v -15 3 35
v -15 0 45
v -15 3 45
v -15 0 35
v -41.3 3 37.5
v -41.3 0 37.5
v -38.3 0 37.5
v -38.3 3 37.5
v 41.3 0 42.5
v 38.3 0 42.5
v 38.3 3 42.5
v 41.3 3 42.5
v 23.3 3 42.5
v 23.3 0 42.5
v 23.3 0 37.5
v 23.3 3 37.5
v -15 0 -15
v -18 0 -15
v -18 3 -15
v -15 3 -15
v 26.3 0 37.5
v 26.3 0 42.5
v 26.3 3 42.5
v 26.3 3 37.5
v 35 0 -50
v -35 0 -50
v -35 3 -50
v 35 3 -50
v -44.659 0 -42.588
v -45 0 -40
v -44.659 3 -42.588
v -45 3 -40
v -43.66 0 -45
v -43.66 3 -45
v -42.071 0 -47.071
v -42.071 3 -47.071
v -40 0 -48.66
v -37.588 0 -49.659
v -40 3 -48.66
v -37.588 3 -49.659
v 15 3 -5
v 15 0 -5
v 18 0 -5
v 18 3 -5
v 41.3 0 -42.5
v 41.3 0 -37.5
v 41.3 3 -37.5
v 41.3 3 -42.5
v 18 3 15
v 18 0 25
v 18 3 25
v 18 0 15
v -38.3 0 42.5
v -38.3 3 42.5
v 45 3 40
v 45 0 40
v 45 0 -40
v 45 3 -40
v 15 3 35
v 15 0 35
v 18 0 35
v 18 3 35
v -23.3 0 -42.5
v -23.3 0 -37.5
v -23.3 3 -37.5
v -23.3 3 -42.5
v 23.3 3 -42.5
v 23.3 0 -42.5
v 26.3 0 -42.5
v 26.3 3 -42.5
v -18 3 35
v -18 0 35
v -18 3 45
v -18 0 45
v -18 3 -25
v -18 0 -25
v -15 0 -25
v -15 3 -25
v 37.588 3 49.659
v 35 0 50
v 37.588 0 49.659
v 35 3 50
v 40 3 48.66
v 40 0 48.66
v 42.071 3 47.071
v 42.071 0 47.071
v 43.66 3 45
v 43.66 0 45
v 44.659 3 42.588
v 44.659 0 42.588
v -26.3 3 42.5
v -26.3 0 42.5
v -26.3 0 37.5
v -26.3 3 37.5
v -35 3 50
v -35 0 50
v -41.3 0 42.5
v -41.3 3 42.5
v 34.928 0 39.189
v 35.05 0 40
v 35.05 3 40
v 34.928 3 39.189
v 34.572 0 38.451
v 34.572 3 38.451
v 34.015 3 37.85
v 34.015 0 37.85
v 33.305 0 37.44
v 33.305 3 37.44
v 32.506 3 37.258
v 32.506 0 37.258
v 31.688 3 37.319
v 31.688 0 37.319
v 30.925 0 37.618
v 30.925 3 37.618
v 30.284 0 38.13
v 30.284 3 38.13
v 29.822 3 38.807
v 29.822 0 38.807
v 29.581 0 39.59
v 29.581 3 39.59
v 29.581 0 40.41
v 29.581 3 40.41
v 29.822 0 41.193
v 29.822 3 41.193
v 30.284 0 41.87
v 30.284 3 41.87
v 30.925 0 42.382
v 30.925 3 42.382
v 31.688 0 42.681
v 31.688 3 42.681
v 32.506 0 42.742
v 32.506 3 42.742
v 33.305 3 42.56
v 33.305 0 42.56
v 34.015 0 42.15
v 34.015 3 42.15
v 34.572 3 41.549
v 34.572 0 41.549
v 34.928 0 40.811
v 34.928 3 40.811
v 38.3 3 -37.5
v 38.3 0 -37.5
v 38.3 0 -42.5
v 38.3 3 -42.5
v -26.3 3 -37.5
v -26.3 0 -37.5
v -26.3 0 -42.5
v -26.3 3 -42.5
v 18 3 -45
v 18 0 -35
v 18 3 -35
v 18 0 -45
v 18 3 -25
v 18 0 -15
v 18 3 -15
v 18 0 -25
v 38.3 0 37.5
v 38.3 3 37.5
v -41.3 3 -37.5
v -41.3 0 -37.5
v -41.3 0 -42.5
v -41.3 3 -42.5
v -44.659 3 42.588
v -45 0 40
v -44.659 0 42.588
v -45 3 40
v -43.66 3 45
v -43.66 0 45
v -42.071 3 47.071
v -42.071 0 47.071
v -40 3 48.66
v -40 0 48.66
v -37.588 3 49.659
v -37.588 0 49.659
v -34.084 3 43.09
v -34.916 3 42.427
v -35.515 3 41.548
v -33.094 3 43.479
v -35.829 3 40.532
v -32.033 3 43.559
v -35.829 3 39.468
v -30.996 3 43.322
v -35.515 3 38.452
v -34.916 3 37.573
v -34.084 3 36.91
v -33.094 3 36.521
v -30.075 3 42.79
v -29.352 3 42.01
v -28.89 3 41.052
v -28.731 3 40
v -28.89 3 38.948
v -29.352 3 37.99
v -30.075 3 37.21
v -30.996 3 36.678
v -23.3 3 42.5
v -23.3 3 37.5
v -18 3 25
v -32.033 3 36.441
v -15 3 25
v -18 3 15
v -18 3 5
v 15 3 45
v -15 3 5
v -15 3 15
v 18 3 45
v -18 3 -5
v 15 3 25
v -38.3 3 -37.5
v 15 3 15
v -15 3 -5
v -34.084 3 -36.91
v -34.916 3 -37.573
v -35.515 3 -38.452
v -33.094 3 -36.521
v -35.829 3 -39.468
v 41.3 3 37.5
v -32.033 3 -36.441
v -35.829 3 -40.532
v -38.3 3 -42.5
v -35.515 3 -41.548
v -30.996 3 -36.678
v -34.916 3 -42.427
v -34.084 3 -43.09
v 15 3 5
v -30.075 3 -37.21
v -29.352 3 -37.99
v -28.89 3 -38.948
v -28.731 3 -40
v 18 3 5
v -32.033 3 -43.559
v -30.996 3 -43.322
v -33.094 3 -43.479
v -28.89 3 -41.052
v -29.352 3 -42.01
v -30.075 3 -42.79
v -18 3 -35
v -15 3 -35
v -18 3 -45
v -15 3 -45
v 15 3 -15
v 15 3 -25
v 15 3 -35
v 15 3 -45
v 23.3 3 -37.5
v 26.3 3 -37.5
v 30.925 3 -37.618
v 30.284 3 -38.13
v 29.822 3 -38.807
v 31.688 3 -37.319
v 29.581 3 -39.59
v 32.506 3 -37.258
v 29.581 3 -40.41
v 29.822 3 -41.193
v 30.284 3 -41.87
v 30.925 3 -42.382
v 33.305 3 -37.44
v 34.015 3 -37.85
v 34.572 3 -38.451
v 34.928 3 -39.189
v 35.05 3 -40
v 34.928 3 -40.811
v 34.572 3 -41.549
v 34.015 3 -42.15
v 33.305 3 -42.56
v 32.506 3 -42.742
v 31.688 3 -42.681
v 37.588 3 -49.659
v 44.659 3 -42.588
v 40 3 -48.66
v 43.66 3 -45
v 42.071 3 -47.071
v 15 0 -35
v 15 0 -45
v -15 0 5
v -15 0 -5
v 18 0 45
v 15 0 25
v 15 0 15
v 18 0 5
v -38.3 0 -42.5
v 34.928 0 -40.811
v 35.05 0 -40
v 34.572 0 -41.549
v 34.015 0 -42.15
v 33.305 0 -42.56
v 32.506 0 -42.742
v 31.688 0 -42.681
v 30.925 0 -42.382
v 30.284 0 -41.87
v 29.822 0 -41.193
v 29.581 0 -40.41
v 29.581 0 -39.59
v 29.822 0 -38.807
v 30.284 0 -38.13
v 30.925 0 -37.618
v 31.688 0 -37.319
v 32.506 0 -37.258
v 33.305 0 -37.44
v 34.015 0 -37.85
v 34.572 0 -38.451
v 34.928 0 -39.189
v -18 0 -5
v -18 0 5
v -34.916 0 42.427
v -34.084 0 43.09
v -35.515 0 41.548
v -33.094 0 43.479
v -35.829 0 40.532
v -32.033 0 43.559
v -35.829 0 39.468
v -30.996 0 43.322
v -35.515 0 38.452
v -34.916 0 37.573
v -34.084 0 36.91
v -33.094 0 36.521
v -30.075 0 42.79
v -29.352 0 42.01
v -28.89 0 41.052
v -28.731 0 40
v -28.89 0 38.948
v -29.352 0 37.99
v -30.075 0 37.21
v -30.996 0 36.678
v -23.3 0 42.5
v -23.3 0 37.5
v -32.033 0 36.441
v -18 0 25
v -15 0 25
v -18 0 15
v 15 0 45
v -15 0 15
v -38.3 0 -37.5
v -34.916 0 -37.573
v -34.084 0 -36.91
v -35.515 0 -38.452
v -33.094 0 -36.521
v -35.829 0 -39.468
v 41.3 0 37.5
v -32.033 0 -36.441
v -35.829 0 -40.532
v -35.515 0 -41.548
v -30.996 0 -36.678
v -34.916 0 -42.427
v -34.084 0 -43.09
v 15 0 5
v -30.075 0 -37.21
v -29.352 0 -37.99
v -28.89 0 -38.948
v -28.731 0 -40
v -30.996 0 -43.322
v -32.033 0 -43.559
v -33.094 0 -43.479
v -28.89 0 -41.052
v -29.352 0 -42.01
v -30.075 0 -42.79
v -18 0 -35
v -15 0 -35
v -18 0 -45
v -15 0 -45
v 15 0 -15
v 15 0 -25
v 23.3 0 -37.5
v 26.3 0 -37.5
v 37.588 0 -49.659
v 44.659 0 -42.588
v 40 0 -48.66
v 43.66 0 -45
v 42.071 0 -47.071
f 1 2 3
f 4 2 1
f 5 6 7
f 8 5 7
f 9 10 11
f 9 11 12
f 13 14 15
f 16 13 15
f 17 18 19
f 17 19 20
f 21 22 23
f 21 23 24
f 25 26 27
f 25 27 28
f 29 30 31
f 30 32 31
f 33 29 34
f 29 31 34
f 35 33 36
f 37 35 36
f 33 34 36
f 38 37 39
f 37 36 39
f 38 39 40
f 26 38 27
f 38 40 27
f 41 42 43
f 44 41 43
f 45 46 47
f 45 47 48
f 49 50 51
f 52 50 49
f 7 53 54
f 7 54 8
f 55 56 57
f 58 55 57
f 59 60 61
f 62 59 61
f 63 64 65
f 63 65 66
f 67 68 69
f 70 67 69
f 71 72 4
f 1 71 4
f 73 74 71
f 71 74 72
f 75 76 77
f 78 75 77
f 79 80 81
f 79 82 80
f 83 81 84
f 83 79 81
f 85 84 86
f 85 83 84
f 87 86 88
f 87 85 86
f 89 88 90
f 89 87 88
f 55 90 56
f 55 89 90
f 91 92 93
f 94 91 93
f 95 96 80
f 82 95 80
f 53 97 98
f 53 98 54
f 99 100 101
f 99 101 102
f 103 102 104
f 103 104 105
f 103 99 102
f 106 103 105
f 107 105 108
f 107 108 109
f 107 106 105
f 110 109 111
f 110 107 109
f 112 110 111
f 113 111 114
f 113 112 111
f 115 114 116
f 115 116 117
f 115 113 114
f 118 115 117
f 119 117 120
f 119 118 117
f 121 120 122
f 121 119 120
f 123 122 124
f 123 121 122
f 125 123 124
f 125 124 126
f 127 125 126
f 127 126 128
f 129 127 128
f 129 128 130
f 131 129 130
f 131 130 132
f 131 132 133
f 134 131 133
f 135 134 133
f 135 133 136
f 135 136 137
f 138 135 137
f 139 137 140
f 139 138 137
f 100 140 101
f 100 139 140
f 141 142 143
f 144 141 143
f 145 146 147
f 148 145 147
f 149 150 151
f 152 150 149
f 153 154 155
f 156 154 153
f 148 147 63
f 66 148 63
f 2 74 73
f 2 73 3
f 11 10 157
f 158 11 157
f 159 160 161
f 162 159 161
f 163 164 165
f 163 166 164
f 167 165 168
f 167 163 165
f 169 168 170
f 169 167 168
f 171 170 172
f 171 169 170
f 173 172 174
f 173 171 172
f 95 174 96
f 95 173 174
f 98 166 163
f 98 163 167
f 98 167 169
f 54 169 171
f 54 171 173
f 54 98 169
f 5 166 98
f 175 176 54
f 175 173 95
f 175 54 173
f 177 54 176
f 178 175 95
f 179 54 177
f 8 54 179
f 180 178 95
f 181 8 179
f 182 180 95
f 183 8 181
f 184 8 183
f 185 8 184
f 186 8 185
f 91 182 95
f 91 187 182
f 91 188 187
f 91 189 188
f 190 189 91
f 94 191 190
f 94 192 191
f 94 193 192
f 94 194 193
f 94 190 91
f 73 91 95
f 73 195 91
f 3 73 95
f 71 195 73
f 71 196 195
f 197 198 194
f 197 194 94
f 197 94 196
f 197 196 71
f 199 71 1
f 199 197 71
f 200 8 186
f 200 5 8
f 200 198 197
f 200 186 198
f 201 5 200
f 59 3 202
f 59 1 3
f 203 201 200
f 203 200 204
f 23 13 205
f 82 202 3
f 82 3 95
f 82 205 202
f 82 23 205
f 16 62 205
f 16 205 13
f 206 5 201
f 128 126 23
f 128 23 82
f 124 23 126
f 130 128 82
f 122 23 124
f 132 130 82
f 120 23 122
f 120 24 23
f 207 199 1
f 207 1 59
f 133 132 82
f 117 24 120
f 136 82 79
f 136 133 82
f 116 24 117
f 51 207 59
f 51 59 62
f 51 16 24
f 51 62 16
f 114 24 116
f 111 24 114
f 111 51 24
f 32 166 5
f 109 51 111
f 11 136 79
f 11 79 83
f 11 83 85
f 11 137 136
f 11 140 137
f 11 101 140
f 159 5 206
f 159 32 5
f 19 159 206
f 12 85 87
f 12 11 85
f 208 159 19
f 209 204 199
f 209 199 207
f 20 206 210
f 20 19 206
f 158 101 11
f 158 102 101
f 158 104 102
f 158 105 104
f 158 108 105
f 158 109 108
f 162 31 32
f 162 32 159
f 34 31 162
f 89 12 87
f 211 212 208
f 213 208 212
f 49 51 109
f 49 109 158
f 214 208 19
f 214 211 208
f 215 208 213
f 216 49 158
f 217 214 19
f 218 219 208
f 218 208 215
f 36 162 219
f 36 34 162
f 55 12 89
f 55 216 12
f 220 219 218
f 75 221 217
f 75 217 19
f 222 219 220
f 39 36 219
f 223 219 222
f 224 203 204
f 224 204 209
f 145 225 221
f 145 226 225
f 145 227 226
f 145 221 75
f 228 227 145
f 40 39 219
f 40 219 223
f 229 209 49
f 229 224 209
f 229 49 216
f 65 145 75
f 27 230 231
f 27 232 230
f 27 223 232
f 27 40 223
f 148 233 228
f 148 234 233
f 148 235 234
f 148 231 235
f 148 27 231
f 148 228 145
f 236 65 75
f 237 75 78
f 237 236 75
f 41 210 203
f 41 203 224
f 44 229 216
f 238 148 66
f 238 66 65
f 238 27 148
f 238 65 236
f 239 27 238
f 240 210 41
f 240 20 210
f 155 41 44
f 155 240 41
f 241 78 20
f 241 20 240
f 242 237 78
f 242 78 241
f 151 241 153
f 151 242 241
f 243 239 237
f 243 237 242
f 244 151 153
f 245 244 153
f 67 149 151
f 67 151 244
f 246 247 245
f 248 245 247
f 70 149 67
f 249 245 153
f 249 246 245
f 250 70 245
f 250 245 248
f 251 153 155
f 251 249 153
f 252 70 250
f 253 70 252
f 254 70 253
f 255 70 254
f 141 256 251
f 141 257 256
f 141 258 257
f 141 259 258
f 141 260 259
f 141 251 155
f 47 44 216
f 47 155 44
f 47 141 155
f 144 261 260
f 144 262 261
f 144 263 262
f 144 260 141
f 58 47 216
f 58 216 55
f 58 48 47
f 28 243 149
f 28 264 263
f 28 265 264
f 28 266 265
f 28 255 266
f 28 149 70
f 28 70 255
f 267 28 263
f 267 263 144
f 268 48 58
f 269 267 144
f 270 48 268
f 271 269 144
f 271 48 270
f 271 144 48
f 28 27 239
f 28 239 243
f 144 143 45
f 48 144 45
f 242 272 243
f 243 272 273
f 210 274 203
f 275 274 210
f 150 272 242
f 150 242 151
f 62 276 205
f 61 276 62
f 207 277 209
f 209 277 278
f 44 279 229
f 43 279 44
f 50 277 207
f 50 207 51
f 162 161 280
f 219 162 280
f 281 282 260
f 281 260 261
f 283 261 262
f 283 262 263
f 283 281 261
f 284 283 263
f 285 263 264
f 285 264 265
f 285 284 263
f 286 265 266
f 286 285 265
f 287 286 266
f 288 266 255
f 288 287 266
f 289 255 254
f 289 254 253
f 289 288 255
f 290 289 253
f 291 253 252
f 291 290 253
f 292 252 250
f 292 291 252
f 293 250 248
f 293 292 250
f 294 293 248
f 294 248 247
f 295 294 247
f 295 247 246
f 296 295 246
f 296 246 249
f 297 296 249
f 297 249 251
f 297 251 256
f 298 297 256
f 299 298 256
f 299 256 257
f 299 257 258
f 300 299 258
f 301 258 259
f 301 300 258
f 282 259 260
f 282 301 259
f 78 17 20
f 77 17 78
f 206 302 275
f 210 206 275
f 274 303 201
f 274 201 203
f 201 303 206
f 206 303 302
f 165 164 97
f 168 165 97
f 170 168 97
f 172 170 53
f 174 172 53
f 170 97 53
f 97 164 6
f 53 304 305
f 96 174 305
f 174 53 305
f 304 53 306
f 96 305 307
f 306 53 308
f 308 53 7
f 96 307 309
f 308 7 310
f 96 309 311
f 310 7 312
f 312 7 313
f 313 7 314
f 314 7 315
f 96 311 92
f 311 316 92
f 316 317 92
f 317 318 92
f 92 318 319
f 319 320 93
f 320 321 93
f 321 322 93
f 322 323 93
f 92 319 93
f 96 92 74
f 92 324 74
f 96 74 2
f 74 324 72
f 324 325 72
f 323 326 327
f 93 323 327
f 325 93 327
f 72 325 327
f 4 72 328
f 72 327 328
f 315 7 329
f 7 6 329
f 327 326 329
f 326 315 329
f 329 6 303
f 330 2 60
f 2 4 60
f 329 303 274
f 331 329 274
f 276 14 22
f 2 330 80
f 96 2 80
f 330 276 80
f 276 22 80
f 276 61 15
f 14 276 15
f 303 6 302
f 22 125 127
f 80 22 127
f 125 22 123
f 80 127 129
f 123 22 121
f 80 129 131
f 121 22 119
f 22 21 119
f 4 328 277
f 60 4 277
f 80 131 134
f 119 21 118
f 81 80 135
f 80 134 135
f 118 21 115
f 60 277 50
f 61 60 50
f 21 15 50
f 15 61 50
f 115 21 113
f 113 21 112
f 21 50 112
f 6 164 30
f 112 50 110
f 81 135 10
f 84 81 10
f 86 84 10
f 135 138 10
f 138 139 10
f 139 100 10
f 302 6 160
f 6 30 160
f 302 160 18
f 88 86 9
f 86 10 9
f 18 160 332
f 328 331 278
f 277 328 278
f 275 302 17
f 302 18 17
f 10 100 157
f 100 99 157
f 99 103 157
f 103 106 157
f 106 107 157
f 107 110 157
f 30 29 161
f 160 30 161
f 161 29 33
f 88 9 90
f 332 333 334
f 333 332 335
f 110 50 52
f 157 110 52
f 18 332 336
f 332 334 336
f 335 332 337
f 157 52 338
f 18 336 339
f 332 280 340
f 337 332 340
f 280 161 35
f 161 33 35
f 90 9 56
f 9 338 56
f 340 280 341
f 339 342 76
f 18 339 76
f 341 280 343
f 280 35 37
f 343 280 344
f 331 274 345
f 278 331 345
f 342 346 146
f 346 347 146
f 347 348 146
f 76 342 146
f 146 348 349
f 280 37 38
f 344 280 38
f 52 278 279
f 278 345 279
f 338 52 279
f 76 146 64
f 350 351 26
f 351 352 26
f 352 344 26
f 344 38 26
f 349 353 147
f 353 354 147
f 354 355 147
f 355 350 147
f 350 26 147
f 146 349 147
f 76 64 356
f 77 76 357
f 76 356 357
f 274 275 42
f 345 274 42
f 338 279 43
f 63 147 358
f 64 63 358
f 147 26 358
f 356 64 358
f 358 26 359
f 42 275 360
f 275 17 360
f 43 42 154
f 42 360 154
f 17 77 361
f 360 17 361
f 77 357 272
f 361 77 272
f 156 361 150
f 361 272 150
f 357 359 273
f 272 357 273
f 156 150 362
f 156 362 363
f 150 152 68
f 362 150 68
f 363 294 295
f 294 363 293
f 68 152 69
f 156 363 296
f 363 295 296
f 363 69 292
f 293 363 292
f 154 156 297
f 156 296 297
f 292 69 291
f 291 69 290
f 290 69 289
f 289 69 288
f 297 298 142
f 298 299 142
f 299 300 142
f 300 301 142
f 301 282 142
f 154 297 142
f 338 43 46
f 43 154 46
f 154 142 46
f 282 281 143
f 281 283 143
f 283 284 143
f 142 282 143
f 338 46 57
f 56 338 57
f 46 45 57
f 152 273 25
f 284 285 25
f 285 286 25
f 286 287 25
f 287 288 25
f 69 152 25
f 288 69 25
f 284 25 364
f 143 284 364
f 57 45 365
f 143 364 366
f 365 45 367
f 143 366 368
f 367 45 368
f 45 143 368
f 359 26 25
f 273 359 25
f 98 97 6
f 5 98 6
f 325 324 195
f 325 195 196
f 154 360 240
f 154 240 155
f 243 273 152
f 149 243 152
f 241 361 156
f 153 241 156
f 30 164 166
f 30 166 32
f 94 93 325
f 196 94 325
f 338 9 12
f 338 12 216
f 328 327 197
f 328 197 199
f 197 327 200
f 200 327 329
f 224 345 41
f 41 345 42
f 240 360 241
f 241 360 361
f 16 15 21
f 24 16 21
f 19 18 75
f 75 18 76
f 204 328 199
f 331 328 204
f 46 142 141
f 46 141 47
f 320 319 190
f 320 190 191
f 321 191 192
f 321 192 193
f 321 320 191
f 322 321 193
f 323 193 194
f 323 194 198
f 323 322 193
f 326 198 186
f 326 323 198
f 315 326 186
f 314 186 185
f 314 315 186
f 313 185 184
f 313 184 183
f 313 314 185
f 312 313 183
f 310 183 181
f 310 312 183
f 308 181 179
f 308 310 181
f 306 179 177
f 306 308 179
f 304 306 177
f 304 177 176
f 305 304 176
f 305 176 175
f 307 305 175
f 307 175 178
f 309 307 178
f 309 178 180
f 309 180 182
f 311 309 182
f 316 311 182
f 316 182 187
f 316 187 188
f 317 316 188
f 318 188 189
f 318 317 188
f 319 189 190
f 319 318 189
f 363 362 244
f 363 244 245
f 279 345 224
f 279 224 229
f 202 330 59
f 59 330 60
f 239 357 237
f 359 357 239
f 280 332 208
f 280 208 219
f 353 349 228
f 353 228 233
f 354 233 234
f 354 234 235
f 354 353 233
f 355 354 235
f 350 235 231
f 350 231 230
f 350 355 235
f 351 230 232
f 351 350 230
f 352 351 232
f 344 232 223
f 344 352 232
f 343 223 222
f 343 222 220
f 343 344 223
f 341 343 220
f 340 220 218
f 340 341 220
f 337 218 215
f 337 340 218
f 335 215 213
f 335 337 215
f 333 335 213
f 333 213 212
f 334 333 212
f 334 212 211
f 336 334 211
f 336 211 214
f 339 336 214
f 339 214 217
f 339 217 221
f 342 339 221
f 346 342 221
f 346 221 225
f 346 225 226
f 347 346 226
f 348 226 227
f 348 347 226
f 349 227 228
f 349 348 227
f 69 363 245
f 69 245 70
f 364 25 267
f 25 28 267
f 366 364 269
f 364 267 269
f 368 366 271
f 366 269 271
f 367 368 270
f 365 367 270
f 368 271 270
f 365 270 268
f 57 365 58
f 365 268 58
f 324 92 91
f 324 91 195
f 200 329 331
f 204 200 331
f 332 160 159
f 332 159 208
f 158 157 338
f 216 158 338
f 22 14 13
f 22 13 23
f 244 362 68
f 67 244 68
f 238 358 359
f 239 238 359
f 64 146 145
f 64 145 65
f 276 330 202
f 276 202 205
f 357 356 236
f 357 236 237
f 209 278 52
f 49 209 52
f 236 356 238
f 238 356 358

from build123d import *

# Parameters (mm, degrees)
SKETCH2_W           = 90
SKETCH2_H           = 100
SKETCH2_R           = 3.5685
SKETCH2_R_2         = 2.75
SKETCH2_W_2         = 3
SKETCH2_H_2         = 5
SKETCH2_H_3         = 10
BOSS_EXTRUDE1_DEPTH = 3
FILLET1_R           = 10


with BuildPart() as part:
    # Sketch2 → Boss-Extrude1 (new body)
    with BuildSketch(Plane(origin=(0, 0, 0), x_dir=(1, 0, 0), z_dir=(0, 1, 0))):
        Rectangle(SKETCH2_W, SKETCH2_H)
        with Locations((-32.3, 40)):
            Circle(SKETCH2_R, mode=Mode.SUBTRACT)
        with Locations((-32.3, -40)):
            Circle(SKETCH2_R, mode=Mode.SUBTRACT)
        with Locations((32.3, 40)):
            Circle(SKETCH2_R_2, mode=Mode.SUBTRACT)
        with Locations((32.3, -40)):
            Circle(SKETCH2_R_2, mode=Mode.SUBTRACT)
        with Locations((39.8, 40)):
            Rectangle(SKETCH2_W_2, SKETCH2_H_2, mode=Mode.SUBTRACT)
        with Locations((-16.5, 20)):
            Rectangle(SKETCH2_W_2, SKETCH2_H_3, mode=Mode.SUBTRACT)
        with Locations((-16.5, 0)):
            Rectangle(SKETCH2_W_2, SKETCH2_H_3, mode=Mode.SUBTRACT)
        with Locations((-16.5, 40)):
            Rectangle(SKETCH2_W_2, SKETCH2_H_3, mode=Mode.SUBTRACT)
        with Locations((-16.5, -20)):
            Rectangle(SKETCH2_W_2, SKETCH2_H_3, mode=Mode.SUBTRACT)
        with Locations((-16.5, -40)):
            Rectangle(SKETCH2_W_2, SKETCH2_H_3, mode=Mode.SUBTRACT)
        with Locations((16.5, -40)):
            Rectangle(SKETCH2_W_2, SKETCH2_H_3, mode=Mode.SUBTRACT)
        with Locations((16.5, -20)):
            Rectangle(SKETCH2_W_2, SKETCH2_H_3, mode=Mode.SUBTRACT)
        with Locations((16.5, 40)):
            Rectangle(SKETCH2_W_2, SKETCH2_H_3, mode=Mode.SUBTRACT)
        with Locations((16.5, 20)):
            Rectangle(SKETCH2_W_2, SKETCH2_H_3, mode=Mode.SUBTRACT)
        with Locations((16.5, 0)):
            Rectangle(SKETCH2_W_2, SKETCH2_H_3, mode=Mode.SUBTRACT)
        with Locations((-39.8, 40)):
            Rectangle(SKETCH2_W_2, SKETCH2_H_2, mode=Mode.SUBTRACT)
        with Locations((39.8, -40)):
            Rectangle(SKETCH2_W_2, SKETCH2_H_2, mode=Mode.SUBTRACT)
        with Locations((-39.8, -40)):
            Rectangle(SKETCH2_W_2, SKETCH2_H_2, mode=Mode.SUBTRACT)
        with Locations((-24.8, -40)):
            Rectangle(SKETCH2_W_2, SKETCH2_H_2, mode=Mode.SUBTRACT)
        with Locations((-24.8, 40)):
            Rectangle(SKETCH2_W_2, SKETCH2_H_2, mode=Mode.SUBTRACT)
        with Locations((24.8, 40)):
            Rectangle(SKETCH2_W_2, SKETCH2_H_2, mode=Mode.SUBTRACT)
        with Locations((24.8, -40)):
            Rectangle(SKETCH2_W_2, SKETCH2_H_2, mode=Mode.SUBTRACT)
    extrude(amount=BOSS_EXTRUDE1_DEPTH)

    # Fillet1
    fillet1_edges = [part.edges().sort_by_distance(p)[0] for p in [
        (-45, 1.5, -50),
        (45, 1.5, -50),
        (45, 1.5, 50),
        (-45, 1.5, 50),
    ]]
    fillet(fillet1_edges, radius=FILLET1_R)


solid = part.part
